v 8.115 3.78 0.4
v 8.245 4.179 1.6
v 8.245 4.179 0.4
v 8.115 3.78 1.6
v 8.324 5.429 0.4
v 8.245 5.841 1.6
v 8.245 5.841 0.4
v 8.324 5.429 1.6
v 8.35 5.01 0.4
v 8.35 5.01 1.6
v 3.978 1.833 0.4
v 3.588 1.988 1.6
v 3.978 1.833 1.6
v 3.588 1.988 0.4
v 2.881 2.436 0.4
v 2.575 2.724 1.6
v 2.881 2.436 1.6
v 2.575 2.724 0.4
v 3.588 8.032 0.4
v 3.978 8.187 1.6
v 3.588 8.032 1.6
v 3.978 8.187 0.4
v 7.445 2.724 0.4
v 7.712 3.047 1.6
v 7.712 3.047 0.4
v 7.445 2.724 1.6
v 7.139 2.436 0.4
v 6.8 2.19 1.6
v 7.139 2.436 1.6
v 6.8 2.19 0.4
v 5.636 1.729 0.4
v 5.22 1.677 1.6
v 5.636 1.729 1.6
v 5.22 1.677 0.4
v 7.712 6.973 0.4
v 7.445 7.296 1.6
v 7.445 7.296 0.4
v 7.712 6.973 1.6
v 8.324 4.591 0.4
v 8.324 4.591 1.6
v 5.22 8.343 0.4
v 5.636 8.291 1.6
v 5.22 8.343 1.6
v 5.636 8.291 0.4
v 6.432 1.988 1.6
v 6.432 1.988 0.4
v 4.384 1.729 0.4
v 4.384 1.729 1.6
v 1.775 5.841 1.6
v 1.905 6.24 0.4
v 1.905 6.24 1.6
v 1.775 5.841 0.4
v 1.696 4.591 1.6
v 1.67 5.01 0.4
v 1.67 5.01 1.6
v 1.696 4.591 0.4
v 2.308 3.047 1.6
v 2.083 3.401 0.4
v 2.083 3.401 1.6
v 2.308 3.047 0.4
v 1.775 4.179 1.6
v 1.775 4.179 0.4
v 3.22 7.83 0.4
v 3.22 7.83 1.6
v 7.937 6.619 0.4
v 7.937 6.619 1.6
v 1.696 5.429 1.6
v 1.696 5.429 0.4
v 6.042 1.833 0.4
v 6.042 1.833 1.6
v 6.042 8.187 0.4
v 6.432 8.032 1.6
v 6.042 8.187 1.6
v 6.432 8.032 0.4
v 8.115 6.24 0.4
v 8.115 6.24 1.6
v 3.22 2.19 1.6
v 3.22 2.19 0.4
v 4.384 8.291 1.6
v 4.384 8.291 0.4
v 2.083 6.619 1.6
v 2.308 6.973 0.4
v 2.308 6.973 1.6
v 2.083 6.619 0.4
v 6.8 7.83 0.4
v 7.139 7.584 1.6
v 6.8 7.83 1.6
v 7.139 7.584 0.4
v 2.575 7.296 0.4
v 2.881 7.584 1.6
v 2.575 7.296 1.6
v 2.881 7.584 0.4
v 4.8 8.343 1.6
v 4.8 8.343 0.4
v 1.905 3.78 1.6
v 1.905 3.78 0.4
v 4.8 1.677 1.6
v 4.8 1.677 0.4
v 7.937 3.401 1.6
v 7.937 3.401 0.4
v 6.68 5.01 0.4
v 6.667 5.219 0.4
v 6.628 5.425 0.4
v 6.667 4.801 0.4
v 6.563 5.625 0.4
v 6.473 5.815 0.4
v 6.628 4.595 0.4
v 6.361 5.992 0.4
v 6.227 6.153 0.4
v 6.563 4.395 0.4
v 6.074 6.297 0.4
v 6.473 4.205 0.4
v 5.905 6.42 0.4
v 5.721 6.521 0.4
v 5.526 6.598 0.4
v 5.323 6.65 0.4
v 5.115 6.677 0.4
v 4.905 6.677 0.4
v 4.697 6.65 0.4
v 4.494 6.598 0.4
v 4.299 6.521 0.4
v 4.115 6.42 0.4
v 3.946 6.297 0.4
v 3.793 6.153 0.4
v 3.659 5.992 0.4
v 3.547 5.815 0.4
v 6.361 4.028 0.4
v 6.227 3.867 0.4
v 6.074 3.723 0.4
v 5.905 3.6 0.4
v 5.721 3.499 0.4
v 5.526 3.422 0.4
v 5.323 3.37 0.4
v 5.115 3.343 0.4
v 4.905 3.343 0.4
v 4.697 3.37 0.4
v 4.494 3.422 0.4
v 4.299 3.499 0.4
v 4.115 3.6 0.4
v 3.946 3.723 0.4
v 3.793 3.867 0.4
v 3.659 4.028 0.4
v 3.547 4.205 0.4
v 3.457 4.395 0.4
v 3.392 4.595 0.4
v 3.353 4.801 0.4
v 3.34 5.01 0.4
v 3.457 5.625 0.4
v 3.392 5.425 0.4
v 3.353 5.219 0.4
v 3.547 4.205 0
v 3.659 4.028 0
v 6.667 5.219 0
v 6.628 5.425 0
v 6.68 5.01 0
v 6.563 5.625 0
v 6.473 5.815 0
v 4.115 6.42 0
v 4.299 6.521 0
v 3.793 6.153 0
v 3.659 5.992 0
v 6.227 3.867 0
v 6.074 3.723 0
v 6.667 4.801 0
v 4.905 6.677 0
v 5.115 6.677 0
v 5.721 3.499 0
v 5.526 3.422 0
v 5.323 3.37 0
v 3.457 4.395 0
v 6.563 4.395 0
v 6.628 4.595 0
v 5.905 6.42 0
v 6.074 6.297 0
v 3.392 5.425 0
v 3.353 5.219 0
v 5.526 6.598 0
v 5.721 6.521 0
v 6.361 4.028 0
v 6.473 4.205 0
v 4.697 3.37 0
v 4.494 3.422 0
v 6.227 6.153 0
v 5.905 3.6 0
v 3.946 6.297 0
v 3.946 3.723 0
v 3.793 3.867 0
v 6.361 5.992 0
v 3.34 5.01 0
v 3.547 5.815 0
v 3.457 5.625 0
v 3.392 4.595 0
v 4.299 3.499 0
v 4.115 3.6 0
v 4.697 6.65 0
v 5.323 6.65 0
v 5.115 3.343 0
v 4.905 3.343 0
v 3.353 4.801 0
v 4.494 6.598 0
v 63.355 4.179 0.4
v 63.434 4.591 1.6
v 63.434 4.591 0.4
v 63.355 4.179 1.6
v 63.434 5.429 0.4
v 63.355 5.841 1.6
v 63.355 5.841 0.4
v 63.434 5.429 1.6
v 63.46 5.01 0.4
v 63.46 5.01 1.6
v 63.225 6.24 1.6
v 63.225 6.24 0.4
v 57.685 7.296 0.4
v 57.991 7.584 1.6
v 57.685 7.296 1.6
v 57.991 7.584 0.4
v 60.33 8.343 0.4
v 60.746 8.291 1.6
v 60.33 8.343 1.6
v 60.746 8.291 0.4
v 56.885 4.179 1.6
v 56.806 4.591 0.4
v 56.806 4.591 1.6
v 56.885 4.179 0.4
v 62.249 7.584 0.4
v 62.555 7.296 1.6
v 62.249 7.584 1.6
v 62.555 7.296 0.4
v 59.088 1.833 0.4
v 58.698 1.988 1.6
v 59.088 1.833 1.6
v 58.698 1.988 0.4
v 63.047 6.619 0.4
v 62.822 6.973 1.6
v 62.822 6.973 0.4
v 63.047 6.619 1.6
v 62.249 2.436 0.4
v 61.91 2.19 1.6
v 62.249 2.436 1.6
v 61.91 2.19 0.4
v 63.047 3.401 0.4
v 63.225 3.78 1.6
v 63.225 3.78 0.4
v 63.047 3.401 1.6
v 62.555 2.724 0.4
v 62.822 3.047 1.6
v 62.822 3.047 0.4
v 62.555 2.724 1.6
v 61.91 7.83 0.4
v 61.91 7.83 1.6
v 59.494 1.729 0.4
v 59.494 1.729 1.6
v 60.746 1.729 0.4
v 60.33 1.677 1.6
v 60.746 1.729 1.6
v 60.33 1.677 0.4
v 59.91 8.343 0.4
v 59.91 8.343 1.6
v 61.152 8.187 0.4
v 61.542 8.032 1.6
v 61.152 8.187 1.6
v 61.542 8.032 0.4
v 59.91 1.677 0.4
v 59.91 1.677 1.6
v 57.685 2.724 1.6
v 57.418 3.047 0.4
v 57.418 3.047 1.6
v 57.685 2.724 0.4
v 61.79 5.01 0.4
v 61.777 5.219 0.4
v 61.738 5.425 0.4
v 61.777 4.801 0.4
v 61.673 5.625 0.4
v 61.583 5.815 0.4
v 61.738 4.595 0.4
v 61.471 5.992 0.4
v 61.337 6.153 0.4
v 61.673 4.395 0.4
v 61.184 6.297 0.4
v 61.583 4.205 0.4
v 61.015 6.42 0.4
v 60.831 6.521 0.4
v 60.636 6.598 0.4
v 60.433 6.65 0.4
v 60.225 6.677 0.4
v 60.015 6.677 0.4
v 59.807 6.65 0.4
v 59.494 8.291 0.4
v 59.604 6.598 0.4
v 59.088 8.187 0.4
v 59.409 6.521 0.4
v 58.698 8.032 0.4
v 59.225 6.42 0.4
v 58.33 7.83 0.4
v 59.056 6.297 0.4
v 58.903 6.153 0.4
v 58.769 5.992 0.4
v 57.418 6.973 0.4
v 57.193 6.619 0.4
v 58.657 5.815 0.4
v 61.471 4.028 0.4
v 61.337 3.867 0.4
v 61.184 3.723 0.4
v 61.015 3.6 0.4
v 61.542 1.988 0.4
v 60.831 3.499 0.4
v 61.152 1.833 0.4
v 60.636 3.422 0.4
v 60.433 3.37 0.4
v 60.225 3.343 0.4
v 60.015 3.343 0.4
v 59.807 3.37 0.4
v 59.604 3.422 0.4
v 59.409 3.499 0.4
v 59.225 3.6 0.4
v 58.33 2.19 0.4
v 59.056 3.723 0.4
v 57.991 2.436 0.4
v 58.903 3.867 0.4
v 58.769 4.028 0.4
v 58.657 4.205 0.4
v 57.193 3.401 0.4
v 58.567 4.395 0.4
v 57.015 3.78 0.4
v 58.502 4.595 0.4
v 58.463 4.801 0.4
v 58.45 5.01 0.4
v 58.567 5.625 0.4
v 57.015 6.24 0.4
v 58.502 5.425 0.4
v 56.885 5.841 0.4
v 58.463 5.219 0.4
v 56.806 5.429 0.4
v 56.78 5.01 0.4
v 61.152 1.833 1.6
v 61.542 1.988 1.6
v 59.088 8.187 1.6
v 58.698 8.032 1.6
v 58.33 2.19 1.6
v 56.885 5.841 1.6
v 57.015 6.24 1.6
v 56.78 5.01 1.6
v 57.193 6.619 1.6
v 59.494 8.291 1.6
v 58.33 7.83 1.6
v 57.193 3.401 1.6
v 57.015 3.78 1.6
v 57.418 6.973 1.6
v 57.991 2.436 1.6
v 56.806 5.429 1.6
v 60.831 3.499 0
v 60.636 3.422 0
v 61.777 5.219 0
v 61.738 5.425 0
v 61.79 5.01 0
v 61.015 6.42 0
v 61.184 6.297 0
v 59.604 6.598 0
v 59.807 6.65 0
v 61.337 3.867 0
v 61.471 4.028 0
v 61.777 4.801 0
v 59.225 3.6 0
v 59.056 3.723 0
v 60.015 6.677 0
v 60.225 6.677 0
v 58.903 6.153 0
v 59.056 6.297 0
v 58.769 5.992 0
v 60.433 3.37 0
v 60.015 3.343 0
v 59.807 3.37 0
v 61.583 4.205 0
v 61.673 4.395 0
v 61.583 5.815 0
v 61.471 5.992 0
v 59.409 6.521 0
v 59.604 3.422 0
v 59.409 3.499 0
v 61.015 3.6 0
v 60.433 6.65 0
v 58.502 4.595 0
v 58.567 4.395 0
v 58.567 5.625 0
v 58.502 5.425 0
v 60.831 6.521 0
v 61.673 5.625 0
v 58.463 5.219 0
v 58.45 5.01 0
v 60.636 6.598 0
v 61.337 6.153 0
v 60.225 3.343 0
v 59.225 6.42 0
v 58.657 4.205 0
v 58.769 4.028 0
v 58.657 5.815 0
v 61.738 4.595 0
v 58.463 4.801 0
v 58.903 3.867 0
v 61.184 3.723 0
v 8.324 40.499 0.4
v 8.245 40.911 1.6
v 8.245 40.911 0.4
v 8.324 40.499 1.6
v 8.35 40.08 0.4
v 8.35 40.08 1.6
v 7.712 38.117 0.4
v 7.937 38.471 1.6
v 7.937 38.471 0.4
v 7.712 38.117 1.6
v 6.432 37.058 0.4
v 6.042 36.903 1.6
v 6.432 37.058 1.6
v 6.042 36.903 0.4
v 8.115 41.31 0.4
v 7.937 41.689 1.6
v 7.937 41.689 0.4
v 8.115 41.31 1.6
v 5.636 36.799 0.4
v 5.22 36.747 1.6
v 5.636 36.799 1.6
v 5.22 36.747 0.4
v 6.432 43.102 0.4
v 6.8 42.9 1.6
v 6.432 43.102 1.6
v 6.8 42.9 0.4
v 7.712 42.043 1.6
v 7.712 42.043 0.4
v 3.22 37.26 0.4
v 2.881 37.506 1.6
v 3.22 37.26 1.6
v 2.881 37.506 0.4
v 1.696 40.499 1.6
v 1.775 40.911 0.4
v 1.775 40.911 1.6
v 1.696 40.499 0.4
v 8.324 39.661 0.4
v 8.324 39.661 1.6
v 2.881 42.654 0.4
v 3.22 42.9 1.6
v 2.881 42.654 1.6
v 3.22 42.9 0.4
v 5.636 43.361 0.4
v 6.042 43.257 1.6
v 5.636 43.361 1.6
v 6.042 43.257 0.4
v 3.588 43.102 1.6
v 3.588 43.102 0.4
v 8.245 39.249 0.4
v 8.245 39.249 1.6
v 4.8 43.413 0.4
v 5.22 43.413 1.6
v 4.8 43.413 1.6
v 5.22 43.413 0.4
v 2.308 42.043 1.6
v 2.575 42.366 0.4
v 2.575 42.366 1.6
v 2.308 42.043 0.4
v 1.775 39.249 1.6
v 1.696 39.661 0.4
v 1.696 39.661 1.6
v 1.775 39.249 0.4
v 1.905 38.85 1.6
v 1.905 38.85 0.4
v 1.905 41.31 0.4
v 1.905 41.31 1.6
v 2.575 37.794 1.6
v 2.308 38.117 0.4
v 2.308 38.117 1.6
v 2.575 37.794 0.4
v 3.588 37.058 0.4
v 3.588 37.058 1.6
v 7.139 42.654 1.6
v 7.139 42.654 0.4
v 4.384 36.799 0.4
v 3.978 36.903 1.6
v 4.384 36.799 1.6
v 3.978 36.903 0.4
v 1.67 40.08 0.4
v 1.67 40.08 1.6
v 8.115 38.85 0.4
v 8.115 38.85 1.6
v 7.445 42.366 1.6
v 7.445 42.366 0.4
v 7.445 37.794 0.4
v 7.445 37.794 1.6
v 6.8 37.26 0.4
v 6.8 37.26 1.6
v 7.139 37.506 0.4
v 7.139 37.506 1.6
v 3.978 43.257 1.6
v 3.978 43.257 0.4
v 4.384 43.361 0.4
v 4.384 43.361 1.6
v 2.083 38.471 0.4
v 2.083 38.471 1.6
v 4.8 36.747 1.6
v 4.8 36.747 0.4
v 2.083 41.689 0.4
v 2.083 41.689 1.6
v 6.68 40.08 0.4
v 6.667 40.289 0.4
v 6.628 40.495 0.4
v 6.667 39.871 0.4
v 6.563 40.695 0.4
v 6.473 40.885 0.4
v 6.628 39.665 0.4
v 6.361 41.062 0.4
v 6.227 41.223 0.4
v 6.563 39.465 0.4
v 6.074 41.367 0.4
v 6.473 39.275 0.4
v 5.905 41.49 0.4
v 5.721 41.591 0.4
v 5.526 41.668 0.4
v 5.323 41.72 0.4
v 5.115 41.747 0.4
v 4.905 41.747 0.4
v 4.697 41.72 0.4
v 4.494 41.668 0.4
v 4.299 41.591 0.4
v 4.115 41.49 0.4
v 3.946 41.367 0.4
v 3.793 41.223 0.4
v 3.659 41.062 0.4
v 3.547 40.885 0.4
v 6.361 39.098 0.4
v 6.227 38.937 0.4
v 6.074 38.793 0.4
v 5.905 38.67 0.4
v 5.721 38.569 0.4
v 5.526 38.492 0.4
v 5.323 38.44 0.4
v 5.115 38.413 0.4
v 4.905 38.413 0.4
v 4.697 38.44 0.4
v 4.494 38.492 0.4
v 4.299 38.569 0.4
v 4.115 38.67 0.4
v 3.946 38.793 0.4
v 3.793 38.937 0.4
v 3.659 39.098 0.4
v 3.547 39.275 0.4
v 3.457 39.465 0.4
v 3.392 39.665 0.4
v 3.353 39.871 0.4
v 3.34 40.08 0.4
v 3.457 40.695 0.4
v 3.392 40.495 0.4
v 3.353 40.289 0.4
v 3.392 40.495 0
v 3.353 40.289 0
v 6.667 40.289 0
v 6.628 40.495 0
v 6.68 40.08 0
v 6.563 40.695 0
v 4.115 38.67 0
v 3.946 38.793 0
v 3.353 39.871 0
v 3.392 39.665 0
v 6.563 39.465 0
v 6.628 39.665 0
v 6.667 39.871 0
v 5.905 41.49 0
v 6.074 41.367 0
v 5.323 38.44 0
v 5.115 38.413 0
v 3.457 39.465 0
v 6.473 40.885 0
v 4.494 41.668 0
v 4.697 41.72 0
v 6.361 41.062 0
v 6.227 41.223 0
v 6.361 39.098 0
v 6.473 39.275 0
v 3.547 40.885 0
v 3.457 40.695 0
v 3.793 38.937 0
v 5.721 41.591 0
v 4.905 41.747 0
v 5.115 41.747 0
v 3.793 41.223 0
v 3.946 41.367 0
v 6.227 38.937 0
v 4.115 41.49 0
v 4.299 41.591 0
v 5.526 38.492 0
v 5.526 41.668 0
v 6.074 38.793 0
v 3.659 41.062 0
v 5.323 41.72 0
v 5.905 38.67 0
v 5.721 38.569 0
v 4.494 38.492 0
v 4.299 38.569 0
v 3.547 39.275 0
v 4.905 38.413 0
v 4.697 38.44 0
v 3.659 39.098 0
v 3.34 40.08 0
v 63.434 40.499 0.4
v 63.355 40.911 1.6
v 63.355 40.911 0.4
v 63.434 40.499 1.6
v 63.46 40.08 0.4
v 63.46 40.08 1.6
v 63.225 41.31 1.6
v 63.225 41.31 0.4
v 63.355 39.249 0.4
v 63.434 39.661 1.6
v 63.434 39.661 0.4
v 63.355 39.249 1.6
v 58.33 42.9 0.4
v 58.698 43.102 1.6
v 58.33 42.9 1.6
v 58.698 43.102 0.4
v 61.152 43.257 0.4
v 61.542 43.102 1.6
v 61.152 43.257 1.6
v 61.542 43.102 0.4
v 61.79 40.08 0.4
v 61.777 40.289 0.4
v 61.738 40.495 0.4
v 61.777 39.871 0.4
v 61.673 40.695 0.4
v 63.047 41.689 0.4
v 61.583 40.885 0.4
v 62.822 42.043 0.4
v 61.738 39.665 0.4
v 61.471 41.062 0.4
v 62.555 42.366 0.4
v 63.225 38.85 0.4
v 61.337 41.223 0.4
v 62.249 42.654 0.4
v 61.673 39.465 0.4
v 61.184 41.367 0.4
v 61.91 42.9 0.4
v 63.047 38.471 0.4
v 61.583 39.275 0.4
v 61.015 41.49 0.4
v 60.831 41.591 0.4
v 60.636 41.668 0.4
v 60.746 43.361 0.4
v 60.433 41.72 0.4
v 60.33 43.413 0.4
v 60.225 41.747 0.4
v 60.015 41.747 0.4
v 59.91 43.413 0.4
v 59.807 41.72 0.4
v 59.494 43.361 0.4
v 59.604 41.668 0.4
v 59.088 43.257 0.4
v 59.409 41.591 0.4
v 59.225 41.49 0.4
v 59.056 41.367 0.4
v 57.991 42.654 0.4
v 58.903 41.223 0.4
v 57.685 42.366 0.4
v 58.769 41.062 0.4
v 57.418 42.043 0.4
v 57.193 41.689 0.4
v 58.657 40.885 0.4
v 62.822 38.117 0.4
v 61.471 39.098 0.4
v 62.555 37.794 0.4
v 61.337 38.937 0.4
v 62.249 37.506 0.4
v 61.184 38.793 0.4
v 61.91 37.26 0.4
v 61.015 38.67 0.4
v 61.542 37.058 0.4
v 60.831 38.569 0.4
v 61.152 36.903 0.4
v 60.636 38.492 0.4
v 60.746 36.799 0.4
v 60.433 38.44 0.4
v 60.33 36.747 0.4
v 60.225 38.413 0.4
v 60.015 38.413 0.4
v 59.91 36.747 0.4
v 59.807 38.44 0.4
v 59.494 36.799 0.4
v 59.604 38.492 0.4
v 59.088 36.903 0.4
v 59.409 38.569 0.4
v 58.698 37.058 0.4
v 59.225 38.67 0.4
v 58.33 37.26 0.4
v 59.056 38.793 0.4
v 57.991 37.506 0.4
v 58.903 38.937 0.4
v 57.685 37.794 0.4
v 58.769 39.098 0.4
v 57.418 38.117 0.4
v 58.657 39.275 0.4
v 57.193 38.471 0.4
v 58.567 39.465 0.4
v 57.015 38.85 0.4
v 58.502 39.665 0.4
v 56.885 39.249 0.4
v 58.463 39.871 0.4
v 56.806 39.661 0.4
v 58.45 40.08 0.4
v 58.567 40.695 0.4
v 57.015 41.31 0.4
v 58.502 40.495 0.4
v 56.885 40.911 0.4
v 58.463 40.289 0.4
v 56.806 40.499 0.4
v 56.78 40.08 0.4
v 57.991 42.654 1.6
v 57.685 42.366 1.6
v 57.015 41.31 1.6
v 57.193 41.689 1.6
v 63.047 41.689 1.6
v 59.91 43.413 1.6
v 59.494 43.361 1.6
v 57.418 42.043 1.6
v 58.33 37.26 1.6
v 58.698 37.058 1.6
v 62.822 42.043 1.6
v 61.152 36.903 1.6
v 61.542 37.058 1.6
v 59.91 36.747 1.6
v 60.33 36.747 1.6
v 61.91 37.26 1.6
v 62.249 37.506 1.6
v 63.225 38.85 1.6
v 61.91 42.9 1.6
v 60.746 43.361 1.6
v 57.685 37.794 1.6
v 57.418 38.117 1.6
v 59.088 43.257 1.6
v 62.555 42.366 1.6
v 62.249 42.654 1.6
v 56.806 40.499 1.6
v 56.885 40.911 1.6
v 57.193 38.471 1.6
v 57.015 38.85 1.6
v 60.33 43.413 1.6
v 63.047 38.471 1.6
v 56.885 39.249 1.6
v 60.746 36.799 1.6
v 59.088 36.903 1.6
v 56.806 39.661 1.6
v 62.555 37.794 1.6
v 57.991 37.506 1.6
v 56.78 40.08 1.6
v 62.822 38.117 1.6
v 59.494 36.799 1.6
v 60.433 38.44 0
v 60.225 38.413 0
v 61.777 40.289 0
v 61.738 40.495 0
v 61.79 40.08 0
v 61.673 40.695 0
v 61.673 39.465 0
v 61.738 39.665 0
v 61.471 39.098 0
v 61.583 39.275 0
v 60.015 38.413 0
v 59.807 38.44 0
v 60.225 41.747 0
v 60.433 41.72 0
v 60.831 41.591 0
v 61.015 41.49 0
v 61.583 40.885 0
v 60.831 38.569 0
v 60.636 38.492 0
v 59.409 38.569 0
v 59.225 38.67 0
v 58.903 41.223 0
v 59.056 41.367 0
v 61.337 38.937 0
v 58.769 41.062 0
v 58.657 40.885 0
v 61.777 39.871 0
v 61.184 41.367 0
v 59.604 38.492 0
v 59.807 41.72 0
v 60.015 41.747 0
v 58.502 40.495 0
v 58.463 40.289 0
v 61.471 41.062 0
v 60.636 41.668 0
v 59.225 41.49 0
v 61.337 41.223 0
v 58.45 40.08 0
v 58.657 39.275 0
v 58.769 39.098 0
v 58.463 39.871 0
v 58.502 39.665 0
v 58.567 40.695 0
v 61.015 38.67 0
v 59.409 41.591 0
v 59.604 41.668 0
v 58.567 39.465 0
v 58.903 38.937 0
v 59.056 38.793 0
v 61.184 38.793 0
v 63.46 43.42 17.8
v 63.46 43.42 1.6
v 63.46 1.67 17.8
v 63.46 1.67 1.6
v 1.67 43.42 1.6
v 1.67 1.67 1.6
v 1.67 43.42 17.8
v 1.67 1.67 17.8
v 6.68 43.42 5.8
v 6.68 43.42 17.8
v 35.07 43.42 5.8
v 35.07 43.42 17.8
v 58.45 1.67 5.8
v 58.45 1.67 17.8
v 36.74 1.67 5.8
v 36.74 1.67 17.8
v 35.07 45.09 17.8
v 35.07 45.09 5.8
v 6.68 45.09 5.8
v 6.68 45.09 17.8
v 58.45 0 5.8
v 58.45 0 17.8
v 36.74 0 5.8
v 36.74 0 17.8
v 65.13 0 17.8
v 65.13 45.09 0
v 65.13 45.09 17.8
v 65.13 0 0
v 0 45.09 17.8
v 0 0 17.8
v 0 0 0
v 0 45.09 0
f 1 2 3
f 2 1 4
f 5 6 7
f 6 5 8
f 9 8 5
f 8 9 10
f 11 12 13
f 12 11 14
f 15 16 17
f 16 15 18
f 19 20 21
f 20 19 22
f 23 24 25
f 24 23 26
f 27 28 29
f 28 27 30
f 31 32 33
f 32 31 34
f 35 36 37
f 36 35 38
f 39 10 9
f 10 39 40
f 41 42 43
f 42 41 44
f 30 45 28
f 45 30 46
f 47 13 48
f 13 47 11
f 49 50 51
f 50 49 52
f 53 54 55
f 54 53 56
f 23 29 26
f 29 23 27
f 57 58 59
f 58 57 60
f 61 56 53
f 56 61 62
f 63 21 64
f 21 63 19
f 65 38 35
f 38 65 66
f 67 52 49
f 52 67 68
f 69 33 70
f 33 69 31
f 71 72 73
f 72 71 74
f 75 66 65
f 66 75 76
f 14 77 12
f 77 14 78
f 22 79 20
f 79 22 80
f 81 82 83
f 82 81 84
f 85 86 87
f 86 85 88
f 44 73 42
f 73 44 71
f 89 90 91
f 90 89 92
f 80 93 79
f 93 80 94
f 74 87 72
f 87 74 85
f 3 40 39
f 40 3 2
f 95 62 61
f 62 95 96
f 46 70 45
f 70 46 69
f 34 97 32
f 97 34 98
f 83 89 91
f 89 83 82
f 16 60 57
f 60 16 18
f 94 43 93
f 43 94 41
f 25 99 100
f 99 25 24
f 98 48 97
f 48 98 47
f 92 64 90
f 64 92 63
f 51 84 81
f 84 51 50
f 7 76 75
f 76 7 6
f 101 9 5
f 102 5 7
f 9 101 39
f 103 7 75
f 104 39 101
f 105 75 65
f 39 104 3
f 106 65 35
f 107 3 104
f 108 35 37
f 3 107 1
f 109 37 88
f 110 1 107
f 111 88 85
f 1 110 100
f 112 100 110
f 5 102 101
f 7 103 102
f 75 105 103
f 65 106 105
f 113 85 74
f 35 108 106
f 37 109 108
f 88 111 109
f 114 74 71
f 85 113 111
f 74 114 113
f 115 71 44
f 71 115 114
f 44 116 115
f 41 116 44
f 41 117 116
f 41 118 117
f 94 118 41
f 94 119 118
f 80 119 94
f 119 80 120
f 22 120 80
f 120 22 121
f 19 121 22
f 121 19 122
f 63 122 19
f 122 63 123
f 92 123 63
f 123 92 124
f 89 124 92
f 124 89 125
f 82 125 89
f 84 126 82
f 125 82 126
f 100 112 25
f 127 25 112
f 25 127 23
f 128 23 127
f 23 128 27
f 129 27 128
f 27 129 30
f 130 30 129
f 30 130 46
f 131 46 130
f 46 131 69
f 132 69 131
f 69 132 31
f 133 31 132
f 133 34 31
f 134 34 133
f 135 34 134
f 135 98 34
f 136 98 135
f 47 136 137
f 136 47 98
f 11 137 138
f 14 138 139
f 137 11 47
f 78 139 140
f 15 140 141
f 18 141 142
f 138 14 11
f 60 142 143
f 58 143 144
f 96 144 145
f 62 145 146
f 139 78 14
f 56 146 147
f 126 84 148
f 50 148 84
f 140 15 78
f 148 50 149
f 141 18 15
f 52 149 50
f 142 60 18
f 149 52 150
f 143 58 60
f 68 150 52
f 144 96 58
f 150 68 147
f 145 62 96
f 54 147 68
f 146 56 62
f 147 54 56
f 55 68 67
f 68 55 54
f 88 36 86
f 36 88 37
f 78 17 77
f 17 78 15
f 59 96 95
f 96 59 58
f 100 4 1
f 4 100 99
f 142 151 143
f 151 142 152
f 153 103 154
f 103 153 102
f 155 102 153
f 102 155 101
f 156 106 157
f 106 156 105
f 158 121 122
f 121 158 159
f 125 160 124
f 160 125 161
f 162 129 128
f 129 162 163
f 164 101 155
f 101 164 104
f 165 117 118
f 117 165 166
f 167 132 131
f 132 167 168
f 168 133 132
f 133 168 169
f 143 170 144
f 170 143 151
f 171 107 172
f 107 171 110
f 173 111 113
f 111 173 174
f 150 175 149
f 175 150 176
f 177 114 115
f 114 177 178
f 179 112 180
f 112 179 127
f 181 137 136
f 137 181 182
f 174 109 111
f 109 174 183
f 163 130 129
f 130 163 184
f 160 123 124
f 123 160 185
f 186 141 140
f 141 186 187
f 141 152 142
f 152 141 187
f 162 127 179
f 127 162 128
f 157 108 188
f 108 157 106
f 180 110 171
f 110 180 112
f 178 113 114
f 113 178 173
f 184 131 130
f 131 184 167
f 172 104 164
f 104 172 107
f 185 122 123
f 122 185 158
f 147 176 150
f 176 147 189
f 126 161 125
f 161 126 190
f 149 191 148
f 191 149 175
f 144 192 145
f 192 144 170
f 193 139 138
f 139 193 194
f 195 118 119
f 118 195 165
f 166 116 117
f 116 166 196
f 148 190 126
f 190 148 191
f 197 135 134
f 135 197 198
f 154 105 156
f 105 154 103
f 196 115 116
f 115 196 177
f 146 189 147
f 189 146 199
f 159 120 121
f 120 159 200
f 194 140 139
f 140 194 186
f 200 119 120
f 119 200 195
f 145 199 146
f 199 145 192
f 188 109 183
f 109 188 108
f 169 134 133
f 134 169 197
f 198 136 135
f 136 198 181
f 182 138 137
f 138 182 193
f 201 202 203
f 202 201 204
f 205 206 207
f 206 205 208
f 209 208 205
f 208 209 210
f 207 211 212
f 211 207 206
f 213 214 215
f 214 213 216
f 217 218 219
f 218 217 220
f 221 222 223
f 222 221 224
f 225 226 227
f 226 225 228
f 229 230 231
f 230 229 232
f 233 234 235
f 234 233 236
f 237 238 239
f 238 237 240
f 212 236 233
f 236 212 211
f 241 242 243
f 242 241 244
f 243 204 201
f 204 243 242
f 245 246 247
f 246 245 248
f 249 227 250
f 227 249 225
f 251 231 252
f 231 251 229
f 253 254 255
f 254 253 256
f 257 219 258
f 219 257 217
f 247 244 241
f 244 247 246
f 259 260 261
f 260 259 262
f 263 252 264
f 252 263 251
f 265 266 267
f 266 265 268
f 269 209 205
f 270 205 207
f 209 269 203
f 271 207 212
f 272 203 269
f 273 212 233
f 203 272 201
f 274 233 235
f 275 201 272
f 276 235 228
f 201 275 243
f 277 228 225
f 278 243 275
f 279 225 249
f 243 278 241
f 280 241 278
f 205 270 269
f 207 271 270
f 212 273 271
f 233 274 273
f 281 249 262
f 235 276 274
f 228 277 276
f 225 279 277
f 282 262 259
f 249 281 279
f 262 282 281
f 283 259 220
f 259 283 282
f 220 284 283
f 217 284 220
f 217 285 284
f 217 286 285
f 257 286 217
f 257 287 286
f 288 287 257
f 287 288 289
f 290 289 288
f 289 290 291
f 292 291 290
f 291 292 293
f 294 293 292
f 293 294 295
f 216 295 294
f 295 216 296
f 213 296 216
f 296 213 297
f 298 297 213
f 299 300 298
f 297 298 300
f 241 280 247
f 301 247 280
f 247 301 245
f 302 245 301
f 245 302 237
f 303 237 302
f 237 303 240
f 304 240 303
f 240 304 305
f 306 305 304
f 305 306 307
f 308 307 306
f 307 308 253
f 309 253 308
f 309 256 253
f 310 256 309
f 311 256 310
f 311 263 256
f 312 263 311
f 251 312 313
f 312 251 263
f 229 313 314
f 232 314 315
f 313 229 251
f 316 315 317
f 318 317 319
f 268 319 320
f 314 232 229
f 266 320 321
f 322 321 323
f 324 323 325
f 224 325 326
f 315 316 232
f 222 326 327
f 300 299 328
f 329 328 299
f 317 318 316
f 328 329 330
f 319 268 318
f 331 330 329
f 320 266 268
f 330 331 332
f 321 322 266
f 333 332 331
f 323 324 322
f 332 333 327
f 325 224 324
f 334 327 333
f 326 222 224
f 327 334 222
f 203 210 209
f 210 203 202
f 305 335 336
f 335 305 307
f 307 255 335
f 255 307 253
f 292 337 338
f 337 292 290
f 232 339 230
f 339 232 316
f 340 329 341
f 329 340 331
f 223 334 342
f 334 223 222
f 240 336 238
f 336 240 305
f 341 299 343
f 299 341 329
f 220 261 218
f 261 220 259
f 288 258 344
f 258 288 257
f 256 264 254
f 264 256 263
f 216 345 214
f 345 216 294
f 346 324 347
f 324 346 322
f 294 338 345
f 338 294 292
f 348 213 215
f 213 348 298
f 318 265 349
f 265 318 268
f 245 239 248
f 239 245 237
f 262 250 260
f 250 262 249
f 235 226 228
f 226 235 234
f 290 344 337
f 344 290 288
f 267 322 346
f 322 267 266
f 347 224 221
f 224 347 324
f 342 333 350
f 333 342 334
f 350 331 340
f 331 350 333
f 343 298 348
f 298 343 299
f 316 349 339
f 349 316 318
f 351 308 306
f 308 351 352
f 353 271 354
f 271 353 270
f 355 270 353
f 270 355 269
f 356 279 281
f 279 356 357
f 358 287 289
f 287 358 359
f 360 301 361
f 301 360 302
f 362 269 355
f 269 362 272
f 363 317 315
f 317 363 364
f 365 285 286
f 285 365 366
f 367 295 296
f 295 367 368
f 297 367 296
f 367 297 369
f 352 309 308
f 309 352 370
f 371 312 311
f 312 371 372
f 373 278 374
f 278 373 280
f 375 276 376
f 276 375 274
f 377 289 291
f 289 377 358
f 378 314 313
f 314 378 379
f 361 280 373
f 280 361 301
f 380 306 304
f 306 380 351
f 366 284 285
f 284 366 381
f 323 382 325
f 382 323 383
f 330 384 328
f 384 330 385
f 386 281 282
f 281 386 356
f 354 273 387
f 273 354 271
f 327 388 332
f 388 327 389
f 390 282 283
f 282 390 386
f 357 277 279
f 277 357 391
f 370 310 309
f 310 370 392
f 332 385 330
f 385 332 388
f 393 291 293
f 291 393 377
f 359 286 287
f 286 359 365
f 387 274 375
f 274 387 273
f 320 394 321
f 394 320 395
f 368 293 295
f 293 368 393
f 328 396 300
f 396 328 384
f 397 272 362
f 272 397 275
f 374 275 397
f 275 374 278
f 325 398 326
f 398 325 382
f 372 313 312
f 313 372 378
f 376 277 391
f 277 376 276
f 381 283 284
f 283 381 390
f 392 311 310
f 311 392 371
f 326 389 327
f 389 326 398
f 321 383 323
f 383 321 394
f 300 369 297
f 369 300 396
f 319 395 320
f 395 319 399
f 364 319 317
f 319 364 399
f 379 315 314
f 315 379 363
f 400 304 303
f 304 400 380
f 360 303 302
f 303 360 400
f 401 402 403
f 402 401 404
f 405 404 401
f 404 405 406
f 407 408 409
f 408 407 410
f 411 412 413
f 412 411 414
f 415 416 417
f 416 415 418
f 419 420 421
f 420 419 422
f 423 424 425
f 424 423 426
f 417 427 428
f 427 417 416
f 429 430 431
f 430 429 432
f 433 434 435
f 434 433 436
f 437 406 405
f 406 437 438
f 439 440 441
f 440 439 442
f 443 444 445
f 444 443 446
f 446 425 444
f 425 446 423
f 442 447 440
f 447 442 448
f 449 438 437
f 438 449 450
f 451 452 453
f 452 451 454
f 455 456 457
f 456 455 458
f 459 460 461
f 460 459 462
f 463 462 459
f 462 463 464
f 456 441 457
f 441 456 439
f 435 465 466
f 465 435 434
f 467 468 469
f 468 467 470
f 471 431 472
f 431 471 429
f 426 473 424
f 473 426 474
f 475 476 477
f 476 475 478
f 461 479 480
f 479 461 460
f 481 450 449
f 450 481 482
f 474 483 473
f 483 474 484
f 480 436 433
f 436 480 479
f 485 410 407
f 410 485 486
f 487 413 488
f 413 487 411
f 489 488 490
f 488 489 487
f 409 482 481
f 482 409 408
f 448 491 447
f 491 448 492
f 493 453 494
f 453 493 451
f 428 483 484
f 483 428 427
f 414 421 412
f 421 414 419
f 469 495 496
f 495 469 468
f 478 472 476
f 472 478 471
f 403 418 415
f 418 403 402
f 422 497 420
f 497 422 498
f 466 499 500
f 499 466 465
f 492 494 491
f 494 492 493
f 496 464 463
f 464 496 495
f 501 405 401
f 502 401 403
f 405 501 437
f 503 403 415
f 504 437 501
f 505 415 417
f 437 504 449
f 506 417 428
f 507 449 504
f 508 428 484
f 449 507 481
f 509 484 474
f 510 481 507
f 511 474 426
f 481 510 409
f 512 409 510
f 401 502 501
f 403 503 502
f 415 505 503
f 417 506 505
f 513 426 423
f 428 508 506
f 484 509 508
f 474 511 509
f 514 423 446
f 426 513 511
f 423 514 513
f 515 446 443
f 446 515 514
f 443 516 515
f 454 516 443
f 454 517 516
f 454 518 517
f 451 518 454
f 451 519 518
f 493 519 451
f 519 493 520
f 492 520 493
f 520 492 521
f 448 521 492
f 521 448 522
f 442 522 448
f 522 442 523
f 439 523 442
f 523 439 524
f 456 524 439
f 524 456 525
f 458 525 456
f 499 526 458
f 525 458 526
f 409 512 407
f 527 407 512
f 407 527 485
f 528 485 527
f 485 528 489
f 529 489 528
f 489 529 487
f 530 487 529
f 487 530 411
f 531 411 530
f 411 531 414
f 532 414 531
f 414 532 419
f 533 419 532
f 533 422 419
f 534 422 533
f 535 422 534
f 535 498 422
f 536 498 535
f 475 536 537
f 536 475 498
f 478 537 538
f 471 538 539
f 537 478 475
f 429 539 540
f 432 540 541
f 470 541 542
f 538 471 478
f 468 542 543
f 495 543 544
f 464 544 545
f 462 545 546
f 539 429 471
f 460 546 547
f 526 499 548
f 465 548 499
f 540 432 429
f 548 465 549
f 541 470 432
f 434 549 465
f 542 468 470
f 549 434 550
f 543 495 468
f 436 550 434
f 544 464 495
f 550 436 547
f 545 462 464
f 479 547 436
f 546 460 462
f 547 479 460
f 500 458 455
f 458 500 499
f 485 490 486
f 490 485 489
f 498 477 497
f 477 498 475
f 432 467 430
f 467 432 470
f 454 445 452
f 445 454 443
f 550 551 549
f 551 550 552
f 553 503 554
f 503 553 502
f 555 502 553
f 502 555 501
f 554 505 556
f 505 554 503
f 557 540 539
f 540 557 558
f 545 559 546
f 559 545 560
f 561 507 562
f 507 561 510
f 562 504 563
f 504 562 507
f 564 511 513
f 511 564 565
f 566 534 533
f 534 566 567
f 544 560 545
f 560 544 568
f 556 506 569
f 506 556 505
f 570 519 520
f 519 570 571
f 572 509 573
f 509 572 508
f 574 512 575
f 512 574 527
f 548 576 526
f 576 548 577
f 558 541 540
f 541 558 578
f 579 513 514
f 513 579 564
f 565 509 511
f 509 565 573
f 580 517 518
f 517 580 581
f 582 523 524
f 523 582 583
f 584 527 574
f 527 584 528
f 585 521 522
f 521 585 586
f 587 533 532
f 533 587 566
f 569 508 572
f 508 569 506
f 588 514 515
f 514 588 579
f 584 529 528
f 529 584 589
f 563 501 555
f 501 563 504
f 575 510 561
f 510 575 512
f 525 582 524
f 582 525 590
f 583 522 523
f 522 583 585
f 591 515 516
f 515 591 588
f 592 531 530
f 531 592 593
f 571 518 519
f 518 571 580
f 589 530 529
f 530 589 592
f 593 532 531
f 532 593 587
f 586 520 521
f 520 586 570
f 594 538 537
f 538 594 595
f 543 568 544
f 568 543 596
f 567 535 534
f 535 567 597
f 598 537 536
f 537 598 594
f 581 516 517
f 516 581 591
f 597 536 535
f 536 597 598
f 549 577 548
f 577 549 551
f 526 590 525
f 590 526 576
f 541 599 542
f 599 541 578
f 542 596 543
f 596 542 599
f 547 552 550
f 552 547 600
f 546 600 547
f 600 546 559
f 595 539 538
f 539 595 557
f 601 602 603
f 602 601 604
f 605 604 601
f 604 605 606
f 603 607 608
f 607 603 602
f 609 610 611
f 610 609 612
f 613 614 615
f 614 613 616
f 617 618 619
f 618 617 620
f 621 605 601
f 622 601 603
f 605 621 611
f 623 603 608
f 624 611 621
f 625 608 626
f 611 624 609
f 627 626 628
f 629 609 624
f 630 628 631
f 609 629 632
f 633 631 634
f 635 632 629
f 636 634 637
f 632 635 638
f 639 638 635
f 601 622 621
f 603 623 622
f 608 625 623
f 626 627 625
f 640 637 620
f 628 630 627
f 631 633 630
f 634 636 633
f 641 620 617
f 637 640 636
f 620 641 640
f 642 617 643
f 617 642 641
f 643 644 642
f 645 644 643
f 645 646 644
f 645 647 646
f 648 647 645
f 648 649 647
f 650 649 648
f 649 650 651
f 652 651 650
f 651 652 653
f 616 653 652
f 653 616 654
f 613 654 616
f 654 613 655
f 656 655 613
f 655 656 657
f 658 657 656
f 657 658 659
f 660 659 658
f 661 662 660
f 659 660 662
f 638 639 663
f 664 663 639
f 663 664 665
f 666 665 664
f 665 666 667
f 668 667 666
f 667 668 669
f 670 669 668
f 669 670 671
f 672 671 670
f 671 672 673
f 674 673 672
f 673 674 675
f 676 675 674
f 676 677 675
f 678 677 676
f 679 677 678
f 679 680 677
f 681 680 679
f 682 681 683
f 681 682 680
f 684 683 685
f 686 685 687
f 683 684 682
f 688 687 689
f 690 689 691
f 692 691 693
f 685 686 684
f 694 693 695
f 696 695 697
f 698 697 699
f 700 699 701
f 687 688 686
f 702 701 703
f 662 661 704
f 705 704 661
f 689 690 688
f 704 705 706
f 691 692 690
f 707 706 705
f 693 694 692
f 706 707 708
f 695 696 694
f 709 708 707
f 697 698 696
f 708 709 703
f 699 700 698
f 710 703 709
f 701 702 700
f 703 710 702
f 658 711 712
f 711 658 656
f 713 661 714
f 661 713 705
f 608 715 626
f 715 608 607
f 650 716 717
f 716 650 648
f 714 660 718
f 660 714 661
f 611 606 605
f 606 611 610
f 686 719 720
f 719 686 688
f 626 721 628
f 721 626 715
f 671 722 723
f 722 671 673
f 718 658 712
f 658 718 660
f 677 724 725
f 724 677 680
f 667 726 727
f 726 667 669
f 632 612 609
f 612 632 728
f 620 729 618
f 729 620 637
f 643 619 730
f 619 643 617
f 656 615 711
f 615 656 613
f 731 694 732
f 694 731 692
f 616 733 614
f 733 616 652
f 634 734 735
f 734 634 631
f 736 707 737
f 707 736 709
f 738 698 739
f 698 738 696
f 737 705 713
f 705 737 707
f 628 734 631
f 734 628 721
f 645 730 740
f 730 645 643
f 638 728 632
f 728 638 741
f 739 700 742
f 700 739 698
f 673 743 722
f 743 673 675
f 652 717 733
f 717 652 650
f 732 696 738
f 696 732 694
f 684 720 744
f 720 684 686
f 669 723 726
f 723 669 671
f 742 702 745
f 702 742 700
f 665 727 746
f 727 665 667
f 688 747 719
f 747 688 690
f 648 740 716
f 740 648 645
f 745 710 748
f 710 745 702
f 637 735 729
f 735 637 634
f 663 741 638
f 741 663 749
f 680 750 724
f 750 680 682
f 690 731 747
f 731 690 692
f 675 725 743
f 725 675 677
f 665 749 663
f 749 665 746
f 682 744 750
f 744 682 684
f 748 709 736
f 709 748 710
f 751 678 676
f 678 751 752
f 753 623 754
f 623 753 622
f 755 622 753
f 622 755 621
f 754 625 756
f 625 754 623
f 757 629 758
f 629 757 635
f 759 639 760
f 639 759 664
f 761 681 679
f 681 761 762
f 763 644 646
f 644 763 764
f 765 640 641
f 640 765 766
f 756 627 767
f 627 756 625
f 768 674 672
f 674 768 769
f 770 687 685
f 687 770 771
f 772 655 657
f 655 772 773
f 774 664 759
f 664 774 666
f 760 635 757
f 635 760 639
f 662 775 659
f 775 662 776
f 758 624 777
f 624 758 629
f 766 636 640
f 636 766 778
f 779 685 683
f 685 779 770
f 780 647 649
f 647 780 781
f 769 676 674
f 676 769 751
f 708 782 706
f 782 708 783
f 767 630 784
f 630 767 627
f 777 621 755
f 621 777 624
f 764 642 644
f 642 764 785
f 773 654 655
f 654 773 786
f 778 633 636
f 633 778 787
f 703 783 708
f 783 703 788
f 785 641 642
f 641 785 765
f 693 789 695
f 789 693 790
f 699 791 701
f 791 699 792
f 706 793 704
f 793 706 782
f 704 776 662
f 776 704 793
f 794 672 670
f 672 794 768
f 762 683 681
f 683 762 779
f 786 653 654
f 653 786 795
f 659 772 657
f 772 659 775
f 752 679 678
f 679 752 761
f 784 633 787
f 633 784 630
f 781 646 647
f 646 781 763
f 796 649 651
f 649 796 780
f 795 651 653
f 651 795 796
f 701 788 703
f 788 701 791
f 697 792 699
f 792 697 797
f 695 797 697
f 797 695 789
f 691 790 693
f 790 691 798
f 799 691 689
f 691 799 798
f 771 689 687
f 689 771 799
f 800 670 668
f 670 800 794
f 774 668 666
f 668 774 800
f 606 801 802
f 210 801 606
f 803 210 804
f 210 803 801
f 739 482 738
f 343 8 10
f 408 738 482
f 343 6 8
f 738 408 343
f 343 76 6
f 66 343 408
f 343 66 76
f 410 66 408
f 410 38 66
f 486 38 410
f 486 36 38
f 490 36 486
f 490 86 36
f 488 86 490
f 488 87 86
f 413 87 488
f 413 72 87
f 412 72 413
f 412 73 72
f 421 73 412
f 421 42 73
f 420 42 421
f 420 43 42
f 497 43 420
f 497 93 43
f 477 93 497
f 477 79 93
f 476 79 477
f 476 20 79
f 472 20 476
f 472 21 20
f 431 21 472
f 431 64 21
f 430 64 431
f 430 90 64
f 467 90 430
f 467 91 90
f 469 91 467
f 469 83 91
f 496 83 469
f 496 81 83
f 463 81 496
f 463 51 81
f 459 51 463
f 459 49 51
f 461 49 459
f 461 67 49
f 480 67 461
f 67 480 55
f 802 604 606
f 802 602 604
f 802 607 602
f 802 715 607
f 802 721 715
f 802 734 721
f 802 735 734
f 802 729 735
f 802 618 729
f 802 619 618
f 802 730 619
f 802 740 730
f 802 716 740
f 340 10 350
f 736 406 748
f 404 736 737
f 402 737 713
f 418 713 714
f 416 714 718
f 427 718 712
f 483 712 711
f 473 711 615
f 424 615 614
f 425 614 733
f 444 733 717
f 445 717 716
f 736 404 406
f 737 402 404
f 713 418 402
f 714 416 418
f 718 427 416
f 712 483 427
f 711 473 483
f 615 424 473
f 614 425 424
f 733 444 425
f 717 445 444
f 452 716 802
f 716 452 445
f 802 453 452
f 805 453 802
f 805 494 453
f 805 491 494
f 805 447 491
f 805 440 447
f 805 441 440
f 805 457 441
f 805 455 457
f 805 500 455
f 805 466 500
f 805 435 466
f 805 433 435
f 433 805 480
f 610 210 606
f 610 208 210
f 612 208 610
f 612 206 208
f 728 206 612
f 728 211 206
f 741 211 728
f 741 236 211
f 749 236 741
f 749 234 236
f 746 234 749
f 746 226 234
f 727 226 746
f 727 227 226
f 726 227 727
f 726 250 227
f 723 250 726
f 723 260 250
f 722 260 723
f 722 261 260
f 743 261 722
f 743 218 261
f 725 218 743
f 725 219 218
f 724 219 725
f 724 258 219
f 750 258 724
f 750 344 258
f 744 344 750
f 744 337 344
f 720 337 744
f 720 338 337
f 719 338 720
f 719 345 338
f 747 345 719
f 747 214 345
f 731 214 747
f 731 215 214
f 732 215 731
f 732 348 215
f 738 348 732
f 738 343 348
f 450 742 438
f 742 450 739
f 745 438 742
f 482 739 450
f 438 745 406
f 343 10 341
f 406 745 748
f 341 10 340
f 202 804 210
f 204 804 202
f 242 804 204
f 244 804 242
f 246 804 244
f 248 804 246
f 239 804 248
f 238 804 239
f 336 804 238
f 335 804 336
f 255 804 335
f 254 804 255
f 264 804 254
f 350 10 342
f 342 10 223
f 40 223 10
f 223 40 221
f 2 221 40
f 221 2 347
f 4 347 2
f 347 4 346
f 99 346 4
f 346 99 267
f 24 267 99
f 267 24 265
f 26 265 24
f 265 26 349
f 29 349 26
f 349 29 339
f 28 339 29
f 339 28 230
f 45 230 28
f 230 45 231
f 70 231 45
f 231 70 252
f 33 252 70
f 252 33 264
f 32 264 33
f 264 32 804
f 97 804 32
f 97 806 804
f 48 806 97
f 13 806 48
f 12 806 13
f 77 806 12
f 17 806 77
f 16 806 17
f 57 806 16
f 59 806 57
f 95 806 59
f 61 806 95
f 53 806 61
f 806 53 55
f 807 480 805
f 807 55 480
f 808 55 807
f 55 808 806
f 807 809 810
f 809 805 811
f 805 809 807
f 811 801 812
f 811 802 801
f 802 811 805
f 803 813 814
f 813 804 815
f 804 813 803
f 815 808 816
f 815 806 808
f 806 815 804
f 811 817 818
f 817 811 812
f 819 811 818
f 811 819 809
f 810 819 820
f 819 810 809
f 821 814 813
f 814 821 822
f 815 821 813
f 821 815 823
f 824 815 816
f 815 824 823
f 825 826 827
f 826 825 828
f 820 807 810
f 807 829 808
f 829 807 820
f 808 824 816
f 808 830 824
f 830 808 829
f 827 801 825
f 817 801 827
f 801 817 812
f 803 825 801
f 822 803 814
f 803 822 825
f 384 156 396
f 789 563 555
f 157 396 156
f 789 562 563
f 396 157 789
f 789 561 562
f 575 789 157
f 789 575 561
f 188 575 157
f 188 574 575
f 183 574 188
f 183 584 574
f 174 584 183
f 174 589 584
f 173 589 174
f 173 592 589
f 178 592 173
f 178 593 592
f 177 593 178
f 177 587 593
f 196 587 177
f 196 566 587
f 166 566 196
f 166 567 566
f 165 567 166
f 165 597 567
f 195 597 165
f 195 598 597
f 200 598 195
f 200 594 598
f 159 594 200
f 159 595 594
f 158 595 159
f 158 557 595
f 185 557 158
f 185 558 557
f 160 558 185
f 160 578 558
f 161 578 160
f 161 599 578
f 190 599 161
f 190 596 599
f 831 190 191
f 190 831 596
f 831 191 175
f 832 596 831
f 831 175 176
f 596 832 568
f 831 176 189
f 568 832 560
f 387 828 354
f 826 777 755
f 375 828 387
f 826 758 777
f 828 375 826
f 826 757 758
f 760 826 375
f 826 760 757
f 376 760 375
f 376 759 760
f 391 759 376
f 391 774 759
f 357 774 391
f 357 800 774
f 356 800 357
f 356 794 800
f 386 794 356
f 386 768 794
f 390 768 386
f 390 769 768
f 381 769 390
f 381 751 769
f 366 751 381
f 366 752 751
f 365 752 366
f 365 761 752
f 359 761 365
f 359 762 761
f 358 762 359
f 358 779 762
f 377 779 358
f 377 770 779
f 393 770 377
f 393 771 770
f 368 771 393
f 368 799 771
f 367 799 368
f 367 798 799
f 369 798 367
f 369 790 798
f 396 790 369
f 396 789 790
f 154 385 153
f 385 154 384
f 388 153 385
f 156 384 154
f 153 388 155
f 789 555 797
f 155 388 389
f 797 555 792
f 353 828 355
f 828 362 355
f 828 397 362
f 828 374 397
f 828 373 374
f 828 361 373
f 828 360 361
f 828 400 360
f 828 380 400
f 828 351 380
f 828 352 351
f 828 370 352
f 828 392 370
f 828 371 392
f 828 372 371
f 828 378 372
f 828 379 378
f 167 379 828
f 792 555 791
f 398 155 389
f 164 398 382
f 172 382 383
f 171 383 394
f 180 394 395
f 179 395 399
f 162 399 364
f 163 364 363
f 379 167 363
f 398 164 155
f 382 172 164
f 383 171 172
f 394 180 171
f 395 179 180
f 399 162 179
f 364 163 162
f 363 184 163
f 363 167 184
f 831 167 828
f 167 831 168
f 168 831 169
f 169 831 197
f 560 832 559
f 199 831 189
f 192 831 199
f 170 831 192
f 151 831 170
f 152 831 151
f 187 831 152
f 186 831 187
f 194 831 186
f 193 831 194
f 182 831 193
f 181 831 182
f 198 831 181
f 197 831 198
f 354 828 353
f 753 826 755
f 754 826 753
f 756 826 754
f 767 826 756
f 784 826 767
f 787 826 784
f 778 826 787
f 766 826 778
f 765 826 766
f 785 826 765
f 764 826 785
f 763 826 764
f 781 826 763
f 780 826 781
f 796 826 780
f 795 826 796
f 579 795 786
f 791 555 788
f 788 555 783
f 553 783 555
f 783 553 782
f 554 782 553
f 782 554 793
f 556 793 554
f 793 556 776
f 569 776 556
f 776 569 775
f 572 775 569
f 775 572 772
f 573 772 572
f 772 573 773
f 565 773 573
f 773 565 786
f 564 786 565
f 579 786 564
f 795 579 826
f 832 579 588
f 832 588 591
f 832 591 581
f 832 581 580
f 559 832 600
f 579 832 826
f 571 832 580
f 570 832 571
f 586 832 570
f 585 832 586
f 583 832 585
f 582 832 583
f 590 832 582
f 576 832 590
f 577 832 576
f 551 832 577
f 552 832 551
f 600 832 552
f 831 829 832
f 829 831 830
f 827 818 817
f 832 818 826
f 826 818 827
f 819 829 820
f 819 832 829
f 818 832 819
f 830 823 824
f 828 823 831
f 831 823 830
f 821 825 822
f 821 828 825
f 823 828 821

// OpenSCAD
first_layer_height = 0.4;
layer_height = 0.6;

bottom_width = first_layer_height + 2*layer_height;
top_width = 2*layer_height;
wall_width = 1.67;

function xy_dim_adj(x) = ceil(x/wall_width)*wall_width;
function  z_dim_adj(z) = ceil(z/layer_height)*layer_height;

box_l = 61;
box_w = 41;
box_h = 16;
box_bt_h = 4;
cap_h = 4;

box_l_adj = xy_dim_adj(box_l);
box_w_adj = xy_dim_adj(box_w);
box_h_adj = z_dim_adj(box_h);
box_bt_h_adj = z_dim_adj(box_bt_h);
cap_h_adj = z_dim_adj(cap_h);

screws_hd = 5.55;
screws_hh = 2.38;
screws_hd_offset = first_layer_height;
screws_d = 3;
screws_xy = [
  [            3*wall_width, 3*wall_width],
  [box_l_adj - 1*wall_width, 3*wall_width],
  [            3*wall_width, box_w_adj-1*wall_width],
  [box_l_adj - 1*wall_width, box_w_adj-1*wall_width]
];

screws_hd_adj = xy_dim_adj(screws_hd);
screws_d_adj = xy_dim_adj(screws_d);

difference() {
  cube([box_l_adj+2*wall_width, box_w_adj+2*wall_width, box_h_adj+bottom_width]);
  union() {
    translate([wall_width, wall_width, bottom_width])
      cube([box_l_adj, box_w_adj, box_h_adj+bottom_width]);
      
    translate([xy_dim_adj(4)+wall_width, box_w_adj, bottom_width+box_bt_h_adj])
      cube([xy_dim_adj(28), 3*wall_width, box_h_adj+bottom_width]);
    translate([xy_dim_adj(34)+wall_width, -wall_width, bottom_width+box_bt_h_adj])
      cube([xy_dim_adj(21), 3*wall_width, box_h_adj+bottom_width]);
    
    for(xy = screws_xy) {
      translate([xy[0], xy[1], screws_hd_offset])
        cylinder(h=bottom_width, d=screws_hd_adj, $fn=50, center=false);
      translate([xy[0], xy[1], 0])
        cylinder(h=3*bottom_width, d=screws_d_adj, $fn=50, center=true);
    }
  }
}

// cap
*translate([-box_l_adj-4*wall_width, 0, 0])
difference() {
  translate([-wall_width, -wall_width, 0])
    cube([box_l_adj+4*wall_width, box_w_adj+4*wall_width, cap_h_adj+bottom_width]);
  translate([0, 0, bottom_width])
    cube([box_l_adj+2*wall_width, box_w_adj+2*wall_width, cap_h_adj+2*bottom_width]);
}
